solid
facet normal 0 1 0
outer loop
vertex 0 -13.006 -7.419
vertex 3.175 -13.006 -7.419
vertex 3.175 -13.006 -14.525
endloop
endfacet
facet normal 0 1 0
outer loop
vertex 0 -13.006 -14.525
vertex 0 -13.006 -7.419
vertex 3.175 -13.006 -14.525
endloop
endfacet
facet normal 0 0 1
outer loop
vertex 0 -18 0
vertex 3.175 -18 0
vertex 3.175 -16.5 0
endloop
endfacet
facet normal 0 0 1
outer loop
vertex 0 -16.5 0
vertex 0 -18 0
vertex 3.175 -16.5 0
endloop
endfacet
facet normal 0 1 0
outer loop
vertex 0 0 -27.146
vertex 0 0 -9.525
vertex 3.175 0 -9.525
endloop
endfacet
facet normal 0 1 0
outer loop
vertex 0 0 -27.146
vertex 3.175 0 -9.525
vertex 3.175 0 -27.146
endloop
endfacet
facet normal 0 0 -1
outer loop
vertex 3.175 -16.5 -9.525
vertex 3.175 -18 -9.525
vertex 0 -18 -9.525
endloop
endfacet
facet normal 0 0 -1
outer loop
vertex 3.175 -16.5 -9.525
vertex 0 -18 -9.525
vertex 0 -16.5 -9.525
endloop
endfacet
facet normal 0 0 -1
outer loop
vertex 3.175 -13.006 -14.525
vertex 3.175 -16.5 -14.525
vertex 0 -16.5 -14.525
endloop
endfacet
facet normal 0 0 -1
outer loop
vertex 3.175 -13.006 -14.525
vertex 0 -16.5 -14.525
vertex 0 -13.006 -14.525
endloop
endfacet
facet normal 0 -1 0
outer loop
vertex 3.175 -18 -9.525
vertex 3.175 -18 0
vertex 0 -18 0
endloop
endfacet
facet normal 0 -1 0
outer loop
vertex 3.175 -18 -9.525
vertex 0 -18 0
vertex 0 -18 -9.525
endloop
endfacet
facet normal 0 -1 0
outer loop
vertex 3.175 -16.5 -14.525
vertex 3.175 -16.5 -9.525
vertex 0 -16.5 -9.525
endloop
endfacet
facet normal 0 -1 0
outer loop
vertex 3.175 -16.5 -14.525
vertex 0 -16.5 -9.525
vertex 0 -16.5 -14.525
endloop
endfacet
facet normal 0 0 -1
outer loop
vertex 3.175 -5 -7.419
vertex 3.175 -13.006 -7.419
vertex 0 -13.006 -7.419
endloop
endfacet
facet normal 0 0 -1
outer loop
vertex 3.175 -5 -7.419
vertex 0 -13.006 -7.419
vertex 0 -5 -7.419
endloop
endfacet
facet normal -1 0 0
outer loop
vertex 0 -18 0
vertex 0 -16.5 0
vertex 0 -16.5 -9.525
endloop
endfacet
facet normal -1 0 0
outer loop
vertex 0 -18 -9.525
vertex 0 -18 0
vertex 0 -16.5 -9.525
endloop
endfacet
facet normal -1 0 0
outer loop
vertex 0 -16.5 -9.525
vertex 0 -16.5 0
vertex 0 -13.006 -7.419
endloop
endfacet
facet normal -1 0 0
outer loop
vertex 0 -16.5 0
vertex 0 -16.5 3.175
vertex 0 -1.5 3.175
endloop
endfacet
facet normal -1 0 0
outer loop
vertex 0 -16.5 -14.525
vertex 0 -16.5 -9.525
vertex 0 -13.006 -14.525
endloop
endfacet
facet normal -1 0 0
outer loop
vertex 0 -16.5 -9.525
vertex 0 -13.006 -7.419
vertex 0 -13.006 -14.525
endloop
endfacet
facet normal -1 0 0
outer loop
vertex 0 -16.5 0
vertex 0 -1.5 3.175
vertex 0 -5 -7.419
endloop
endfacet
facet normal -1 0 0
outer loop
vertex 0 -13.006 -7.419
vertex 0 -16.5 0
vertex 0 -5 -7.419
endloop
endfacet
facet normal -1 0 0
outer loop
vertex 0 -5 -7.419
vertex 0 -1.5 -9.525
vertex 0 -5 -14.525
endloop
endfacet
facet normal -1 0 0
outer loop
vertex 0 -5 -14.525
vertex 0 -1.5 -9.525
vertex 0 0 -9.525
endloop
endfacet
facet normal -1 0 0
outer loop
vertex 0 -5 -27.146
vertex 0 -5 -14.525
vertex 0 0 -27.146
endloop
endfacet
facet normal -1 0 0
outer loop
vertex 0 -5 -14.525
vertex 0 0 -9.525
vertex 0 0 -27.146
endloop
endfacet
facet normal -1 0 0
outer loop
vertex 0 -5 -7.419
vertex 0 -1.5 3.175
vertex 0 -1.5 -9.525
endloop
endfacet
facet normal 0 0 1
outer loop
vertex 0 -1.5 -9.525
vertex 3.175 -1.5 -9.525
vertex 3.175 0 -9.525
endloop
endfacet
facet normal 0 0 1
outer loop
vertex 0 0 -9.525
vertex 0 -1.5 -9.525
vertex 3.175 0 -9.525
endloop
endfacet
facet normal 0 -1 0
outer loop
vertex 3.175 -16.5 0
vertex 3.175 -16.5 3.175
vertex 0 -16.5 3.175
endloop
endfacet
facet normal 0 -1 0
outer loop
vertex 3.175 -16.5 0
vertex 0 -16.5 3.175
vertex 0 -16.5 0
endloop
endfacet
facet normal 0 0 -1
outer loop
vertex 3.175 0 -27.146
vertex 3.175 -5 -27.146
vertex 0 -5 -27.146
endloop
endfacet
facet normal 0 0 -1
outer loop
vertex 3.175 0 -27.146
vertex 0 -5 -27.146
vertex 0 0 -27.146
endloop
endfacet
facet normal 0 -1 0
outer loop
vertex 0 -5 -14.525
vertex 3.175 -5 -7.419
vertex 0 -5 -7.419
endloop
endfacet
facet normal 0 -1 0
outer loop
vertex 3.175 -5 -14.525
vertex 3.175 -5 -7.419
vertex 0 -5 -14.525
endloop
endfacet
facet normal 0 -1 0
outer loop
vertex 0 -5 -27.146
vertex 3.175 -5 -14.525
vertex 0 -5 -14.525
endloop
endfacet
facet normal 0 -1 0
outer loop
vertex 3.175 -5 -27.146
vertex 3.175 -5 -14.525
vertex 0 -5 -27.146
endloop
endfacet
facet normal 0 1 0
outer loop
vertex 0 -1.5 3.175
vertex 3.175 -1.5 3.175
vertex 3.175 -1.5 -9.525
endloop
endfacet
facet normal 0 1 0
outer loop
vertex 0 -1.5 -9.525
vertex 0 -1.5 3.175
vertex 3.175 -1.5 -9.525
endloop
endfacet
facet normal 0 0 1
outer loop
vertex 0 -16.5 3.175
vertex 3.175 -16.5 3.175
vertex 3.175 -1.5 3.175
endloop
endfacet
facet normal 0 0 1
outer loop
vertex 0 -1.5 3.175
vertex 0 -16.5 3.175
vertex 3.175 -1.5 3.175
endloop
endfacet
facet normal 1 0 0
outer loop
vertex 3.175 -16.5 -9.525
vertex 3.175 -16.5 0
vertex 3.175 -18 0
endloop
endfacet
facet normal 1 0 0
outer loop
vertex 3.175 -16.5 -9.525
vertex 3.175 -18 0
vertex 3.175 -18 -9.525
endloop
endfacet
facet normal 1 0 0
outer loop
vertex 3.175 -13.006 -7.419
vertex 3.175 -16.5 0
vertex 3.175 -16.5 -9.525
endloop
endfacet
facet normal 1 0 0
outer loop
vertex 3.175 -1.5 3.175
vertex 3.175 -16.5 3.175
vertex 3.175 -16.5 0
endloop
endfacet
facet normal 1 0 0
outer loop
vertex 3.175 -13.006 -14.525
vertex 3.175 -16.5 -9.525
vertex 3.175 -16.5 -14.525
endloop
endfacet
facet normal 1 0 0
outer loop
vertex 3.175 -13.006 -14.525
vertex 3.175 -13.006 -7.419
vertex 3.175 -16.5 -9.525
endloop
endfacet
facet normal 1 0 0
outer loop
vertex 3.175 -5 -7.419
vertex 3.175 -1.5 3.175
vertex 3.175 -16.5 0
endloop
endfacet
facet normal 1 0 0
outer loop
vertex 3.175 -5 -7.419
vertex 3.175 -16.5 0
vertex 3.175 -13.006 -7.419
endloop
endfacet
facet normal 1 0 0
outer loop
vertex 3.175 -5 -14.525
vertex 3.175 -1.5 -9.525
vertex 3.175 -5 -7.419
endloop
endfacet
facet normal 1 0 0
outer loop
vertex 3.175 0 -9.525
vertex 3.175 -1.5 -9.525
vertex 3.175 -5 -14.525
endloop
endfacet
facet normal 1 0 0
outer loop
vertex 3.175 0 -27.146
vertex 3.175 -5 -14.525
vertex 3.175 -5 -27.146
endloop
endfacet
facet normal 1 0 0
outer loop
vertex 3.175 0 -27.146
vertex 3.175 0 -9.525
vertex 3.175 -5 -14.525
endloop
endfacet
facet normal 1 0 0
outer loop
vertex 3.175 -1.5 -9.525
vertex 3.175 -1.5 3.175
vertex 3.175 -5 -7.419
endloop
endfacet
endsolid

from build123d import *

# Parameters (mm, degrees)
SKETCH1_W           = 16.5
SKETCH1_H           = 43
BOSS_EXTRUDE1_DEPTH = 3.175
SKETCH2_W           = 9.525
SKETCH2_H           = 1.5
CUT_EXTRUDE1_DEPTH  = 10
SKETCH3_W           = 28.475
SKETCH3_H           = 11.5
CUT_EXTRUDE2_DEPTH  = 4.175
SKETCH5_W           = 3.175
SKETCH5_H           = 15
BOSS_EXTRUDE2_DEPTH = 3.175
SKETCH6_W           = 15.854218726
SKETCH6_H           = 5
SKETCH6_W_2         = 7.106349473
SKETCH6_H_2         = 8.006430413
CUT_EXTRUDE4_DEPTH  = 10
SKETCH7_W           = 9.525
SKETCH7_H           = 1.5
BOSS_EXTRUDE3_DEPTH = 3.175


with BuildPart() as part:
    # Sketch1 → Boss-Extrude1 (new body)
    with BuildSketch(Plane(origin=(0, 0, 0), x_dir=(0, -1, 0), z_dir=(1, 0, 0))):
        with Locations((8.25, 21.5)):
            Rectangle(SKETCH1_W, SKETCH1_H)
    extrude(amount=BOSS_EXTRUDE1_DEPTH)

    # Sketch2 → Cut-Extrude1 (cut)
    with BuildSketch(Plane(origin=(3.175, 0, 0), x_dir=(0, 0, -1), z_dir=(1, 0, 0))):
        with Locations((4.7625, -0.75)):
            Rectangle(SKETCH2_W, SKETCH2_H)
    extrude(amount=-CUT_EXTRUDE1_DEPTH, mode=Mode.SUBTRACT)

    # Sketch3 → Cut-Extrude2 (cut, through all)
    with BuildSketch(Plane(origin=(3.175, 0, 0), x_dir=(0, 0, -1), z_dir=(1, 0, 0))):
        with Locations((28.7625, -10.75)):
            Rectangle(SKETCH3_W, SKETCH3_H)
    extrude(amount=-CUT_EXTRUDE2_DEPTH, mode=Mode.SUBTRACT)

    # Sketch5 → Boss-Extrude2 (add)
    with BuildSketch(Plane(origin=(3.175, 0, 0), x_dir=(0, 0, -1), z_dir=(1, 0, 0))):
        with Locations((-1.5875, -9)):
            Rectangle(SKETCH5_W, SKETCH5_H)
    extrude(amount=-BOSS_EXTRUDE2_DEPTH)

    # Sketch6 → Cut-Extrude4 (cut)
    with BuildSketch(Plane(origin=(3.175, 0, 0), x_dir=(0, 0, -1), z_dir=(1, 0, 0))):
        with Locations((35.072890637, -2.5)):
            Rectangle(SKETCH6_W, SKETCH6_H)
        with Locations((10.971825264, -9.003215207)):
            Rectangle(SKETCH6_W_2, SKETCH6_H_2)
    extrude(amount=-CUT_EXTRUDE4_DEPTH, mode=Mode.SUBTRACT)

    # Sketch7 → Boss-Extrude3 (add)
    with BuildSketch(Plane(origin=(3.175, 0, 0), x_dir=(0, 0, -1), z_dir=(1, 0, 0))):
        with Locations((4.7625, -17.25)):
            Rectangle(SKETCH7_W, SKETCH7_H)
    extrude(amount=-BOSS_EXTRUDE3_DEPTH)


solid = part.part
